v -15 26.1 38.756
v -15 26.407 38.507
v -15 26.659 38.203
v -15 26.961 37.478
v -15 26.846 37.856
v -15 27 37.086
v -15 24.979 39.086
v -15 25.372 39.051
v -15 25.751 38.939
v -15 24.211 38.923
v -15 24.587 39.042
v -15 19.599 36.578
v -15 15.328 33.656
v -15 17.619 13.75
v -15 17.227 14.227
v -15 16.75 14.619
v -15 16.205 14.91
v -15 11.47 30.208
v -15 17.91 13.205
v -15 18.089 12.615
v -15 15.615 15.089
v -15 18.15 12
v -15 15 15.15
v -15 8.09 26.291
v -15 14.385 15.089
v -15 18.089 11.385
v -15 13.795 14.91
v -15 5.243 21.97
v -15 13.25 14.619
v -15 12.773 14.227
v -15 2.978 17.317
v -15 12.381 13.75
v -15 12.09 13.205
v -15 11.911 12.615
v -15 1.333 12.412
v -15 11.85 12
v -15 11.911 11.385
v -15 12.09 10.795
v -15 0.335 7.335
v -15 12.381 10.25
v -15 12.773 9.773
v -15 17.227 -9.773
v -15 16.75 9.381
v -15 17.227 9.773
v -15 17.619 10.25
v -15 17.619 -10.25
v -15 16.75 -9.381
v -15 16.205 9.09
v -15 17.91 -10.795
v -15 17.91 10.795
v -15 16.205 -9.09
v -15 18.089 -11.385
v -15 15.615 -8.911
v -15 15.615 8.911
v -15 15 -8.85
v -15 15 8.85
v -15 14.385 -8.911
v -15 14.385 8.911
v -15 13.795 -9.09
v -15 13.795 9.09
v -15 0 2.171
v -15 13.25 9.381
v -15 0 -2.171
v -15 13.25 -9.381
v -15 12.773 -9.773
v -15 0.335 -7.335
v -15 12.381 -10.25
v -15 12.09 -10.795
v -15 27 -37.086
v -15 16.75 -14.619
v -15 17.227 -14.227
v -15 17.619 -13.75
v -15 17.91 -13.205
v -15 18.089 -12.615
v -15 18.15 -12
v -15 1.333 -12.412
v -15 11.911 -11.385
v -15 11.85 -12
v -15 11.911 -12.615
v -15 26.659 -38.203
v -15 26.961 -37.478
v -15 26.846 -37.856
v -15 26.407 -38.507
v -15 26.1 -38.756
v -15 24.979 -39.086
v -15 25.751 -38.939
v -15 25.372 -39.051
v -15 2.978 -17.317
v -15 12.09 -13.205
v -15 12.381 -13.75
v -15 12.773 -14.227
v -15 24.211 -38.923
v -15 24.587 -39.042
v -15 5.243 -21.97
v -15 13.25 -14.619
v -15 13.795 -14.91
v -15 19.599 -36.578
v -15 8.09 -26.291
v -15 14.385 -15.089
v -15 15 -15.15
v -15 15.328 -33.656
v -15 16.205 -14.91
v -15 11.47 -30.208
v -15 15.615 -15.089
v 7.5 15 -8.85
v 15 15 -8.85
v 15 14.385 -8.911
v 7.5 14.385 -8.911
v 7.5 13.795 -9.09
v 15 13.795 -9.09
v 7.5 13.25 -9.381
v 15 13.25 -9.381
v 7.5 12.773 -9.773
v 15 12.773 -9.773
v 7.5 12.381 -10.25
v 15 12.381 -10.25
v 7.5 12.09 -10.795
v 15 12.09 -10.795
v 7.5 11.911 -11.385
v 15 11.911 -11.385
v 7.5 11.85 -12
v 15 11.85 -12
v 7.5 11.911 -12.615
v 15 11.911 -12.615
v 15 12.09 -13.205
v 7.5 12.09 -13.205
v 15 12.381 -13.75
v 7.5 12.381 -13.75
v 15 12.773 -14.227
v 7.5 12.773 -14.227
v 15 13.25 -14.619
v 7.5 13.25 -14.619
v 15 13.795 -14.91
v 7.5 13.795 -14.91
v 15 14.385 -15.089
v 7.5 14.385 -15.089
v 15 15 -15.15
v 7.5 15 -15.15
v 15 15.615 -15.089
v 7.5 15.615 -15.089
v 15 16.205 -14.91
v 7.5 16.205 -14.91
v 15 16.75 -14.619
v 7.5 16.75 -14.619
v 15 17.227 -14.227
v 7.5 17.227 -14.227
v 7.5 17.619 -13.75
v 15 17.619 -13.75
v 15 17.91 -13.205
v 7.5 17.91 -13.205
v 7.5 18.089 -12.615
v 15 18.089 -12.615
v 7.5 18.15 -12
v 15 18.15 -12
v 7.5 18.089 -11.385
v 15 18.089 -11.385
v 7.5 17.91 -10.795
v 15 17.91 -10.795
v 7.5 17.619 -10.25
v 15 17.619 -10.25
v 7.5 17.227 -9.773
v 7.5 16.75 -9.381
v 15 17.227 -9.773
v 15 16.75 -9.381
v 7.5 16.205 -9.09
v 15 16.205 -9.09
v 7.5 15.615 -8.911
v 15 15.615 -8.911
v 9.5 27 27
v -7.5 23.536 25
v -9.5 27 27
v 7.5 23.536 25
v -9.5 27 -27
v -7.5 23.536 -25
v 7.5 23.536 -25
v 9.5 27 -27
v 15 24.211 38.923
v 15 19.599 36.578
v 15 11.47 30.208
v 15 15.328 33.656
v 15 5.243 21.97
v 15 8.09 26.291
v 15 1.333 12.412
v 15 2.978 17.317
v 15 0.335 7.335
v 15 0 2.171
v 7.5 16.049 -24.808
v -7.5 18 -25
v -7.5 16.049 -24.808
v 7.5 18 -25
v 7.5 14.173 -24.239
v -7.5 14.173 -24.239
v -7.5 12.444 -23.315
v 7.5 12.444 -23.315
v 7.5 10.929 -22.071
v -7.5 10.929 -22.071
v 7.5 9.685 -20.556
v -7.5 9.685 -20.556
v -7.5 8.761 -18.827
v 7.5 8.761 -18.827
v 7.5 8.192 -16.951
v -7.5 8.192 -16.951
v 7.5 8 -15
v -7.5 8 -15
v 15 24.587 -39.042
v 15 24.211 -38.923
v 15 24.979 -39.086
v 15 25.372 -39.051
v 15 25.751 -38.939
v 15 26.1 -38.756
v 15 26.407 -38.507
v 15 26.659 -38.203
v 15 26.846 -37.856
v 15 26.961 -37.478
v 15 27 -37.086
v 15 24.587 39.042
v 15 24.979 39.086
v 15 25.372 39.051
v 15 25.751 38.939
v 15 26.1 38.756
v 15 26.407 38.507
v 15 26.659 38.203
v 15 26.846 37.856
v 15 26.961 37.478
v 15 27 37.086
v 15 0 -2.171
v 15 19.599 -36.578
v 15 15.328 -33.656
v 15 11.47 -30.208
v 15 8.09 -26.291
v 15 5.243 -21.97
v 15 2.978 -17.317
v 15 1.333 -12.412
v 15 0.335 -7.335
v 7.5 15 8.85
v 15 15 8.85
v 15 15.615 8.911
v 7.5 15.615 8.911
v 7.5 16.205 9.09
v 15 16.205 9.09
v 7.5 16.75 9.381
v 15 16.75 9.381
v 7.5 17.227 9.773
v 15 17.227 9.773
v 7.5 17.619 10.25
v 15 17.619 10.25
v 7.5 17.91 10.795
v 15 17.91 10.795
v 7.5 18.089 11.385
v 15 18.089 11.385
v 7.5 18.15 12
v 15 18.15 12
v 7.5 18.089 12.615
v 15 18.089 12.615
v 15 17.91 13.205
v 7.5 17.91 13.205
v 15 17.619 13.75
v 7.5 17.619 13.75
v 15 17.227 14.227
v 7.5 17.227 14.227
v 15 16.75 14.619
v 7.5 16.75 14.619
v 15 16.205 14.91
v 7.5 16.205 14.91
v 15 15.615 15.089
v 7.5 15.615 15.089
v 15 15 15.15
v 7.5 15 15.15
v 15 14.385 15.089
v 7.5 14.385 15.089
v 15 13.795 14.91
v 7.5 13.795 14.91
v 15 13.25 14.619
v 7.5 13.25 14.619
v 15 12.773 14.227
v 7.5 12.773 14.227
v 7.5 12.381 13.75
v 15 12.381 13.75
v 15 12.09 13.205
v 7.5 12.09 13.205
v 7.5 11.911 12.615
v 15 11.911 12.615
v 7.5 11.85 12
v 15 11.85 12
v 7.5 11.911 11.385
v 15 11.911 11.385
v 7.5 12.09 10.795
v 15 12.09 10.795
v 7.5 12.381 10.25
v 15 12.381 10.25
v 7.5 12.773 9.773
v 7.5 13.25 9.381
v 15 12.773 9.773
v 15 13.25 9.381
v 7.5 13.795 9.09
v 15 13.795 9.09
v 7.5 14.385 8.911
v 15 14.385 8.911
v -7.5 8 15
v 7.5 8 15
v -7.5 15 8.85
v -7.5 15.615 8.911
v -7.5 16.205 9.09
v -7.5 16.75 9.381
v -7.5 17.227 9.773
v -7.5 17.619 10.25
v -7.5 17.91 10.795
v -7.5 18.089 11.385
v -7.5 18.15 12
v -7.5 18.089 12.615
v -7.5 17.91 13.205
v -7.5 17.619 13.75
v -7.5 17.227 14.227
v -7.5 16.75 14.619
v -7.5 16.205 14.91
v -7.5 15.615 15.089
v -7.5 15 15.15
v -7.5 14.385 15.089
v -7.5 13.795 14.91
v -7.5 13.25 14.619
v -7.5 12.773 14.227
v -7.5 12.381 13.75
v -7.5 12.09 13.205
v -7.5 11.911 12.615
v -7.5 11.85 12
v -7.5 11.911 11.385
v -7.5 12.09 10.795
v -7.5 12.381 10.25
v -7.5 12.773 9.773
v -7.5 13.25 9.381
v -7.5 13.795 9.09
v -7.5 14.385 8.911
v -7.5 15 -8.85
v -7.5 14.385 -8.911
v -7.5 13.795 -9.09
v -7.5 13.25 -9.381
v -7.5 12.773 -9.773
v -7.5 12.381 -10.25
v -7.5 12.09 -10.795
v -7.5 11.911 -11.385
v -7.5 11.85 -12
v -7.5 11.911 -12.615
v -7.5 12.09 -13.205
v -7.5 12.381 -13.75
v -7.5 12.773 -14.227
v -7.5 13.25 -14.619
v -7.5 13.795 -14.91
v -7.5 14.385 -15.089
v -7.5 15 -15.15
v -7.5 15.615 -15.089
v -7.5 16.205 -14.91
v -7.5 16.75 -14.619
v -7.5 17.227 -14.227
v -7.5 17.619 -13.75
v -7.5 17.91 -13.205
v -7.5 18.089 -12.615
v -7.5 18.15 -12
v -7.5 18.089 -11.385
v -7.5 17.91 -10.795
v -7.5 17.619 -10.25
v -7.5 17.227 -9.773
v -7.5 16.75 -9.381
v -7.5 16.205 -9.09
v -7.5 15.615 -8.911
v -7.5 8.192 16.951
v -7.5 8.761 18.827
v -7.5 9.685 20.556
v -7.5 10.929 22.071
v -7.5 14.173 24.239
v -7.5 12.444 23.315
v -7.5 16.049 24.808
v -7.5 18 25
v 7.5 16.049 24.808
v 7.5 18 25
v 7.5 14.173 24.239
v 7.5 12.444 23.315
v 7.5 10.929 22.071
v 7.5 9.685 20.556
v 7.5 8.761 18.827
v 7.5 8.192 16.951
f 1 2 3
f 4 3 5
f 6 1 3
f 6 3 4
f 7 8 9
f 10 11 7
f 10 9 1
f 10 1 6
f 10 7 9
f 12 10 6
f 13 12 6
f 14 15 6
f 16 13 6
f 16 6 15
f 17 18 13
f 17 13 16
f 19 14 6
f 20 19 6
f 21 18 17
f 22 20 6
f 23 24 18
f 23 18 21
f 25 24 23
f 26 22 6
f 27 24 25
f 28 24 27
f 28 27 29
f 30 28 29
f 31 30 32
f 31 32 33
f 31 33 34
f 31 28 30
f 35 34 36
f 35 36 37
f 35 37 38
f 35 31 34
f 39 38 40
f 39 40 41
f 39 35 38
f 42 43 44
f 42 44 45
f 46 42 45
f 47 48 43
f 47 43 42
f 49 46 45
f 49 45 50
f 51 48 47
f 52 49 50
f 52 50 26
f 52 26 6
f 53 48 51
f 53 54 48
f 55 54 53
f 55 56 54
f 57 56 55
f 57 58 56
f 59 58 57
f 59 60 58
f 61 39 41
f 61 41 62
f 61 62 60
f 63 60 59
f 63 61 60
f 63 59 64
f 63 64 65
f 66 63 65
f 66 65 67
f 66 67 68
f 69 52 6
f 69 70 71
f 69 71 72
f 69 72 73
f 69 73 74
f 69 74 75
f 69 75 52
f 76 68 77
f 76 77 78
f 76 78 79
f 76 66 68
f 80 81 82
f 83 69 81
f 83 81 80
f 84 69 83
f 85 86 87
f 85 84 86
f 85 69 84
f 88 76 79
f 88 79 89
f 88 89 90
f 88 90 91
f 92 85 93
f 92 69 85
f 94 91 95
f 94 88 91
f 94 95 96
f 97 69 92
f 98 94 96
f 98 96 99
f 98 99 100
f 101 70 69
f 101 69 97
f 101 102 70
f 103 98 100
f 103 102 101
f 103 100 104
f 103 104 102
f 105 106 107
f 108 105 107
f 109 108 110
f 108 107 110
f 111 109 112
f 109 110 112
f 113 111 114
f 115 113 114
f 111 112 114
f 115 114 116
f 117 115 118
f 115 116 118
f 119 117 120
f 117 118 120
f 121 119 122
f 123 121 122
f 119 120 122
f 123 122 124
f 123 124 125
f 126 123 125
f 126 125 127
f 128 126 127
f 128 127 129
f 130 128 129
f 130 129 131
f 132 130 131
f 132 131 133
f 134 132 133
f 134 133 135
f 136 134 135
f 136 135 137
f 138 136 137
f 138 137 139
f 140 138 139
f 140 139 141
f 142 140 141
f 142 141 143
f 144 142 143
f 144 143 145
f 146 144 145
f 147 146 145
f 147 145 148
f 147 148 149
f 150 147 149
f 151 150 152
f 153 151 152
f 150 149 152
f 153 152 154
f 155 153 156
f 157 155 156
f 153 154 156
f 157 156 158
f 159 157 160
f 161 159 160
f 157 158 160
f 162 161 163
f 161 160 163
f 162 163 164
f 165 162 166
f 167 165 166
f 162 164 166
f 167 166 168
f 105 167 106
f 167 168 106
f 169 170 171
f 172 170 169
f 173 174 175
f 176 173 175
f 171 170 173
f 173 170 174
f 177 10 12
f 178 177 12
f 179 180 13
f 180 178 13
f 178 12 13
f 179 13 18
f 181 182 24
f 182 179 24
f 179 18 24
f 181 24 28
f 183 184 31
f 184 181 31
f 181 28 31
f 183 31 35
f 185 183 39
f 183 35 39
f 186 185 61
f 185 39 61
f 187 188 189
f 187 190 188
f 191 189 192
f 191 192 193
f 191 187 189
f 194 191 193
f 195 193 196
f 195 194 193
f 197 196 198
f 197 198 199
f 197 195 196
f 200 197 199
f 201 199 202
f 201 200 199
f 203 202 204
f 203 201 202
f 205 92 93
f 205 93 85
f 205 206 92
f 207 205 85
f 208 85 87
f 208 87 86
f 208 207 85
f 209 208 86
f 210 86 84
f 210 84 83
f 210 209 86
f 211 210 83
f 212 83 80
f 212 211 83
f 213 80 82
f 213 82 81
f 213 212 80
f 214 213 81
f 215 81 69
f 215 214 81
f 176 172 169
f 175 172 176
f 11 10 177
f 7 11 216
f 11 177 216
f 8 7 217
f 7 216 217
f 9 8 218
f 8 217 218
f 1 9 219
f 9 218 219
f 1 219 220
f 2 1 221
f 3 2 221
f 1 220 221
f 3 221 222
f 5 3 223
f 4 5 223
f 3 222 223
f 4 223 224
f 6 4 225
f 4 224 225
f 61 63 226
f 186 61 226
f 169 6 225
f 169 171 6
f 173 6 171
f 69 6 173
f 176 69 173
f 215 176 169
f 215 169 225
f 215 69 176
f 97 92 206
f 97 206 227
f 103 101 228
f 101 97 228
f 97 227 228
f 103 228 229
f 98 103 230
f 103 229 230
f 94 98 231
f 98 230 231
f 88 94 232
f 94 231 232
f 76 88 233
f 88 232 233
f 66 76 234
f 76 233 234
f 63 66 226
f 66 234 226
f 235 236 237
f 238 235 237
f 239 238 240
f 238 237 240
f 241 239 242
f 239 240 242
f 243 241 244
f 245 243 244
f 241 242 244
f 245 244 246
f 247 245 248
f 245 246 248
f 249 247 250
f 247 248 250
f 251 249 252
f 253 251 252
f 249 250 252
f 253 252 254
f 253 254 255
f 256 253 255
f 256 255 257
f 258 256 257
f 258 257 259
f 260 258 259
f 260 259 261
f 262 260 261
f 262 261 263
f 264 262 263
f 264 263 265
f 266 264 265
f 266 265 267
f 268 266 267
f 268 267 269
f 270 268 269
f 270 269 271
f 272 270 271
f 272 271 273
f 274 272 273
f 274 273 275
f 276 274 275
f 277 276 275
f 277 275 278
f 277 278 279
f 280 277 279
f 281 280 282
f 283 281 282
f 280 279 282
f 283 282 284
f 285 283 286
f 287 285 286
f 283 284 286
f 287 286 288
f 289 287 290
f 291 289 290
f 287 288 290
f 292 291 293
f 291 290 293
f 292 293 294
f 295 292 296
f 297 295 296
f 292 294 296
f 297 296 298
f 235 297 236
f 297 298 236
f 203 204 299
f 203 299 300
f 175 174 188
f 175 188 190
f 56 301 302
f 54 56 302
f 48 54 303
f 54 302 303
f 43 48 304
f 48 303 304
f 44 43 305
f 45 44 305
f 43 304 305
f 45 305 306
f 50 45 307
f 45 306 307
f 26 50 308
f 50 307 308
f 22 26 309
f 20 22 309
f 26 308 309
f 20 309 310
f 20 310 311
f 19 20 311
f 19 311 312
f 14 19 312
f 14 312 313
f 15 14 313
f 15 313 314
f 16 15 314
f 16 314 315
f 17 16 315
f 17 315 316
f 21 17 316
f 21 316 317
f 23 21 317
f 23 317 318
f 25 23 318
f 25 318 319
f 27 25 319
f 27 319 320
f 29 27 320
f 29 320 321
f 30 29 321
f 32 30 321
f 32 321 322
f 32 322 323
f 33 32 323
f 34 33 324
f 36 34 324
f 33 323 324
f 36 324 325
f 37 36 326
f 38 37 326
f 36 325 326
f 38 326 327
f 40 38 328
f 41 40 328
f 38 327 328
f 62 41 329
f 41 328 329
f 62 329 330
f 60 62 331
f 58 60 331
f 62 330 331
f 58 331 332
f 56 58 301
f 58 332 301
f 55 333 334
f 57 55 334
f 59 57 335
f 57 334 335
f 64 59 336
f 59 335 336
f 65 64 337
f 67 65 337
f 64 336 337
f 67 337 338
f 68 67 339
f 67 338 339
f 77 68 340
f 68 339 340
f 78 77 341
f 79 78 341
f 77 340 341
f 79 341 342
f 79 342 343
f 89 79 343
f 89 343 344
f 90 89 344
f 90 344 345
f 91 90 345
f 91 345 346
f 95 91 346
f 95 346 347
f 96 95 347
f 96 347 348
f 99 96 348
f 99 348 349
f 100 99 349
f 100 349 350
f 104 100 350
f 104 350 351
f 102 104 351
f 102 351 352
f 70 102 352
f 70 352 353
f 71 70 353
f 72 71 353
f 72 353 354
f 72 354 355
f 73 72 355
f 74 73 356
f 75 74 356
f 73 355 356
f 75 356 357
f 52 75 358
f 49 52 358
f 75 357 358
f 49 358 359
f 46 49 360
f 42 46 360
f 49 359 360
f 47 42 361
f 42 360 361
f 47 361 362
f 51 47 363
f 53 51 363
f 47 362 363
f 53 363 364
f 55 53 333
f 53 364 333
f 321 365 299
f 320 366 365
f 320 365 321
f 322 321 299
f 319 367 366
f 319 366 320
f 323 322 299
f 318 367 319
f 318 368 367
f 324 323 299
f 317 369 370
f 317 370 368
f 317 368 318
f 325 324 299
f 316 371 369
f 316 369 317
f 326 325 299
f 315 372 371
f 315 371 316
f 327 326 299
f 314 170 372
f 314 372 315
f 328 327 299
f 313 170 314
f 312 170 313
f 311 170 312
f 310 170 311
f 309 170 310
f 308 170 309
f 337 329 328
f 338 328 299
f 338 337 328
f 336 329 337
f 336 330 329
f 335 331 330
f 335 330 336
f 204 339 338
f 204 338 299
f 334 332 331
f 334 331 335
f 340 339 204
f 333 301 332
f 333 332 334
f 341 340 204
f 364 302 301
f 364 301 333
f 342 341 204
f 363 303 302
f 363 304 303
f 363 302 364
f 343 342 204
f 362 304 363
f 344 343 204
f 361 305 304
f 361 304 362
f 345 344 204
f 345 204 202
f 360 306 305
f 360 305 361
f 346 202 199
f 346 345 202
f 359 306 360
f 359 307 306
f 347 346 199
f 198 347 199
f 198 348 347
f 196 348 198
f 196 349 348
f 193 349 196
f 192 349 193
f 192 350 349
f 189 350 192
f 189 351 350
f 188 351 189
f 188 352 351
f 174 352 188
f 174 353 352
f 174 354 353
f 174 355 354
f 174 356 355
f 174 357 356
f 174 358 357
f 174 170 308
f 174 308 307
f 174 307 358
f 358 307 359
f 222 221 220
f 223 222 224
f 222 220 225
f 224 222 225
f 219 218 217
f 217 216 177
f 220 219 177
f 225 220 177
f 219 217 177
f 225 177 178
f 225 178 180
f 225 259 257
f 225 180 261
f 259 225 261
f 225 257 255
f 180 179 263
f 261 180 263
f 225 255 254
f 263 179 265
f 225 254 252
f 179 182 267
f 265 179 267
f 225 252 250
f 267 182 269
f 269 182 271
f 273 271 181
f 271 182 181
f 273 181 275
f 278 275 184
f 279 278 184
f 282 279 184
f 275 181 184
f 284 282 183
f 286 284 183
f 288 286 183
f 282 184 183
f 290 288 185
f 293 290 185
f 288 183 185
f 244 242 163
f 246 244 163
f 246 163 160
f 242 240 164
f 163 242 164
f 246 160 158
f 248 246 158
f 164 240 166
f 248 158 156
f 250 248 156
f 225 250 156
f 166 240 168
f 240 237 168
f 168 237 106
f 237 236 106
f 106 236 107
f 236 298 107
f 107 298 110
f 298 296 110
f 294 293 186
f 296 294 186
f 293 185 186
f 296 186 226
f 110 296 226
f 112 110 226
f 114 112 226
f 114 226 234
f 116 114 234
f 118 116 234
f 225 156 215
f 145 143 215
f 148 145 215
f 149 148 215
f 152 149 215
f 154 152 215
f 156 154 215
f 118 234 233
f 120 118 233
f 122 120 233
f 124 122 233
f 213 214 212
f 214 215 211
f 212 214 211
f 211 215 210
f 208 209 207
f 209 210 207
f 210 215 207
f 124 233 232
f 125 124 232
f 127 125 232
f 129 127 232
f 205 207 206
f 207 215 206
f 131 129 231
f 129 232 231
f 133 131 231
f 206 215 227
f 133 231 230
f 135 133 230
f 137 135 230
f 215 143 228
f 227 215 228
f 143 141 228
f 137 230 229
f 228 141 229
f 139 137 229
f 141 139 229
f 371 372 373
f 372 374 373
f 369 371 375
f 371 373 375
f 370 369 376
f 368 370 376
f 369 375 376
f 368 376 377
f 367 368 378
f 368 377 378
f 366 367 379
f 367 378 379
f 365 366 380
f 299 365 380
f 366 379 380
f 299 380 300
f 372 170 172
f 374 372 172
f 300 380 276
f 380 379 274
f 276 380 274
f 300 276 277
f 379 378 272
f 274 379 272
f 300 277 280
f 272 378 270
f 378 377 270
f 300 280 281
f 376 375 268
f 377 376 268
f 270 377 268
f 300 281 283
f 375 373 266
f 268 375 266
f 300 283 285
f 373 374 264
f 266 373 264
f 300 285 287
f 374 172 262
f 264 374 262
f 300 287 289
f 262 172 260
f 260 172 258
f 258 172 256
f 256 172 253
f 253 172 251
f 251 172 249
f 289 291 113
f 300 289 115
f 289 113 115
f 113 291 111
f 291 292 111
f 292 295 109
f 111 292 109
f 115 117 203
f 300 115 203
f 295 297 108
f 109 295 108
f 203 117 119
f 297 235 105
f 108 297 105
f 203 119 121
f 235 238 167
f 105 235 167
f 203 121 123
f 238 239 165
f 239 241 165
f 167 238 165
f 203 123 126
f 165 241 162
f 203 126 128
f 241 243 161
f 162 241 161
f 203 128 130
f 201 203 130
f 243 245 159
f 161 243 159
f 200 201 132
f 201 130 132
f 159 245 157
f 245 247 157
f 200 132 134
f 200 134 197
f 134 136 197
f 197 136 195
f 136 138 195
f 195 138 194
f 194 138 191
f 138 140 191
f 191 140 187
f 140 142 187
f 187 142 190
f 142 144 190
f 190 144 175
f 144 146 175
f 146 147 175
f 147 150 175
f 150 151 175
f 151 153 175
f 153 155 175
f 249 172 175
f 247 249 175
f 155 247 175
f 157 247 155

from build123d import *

# Parameters (mm, degrees)
SKETCH1_W           = 30
SKETCH1_H           = 80
BOSS_EXTRUDE1_DEPTH = 27
SKETCH5_W           = 30
SKETCH5_H           = 10
BOSS_EXTRUDE2_DEPTH = 6
SKETCH2_R           = 3.15
CUT_EXTRUDE1_DEPTH  = 40
FILLET5_R           = 40
FILLET6_R           = 40
FILLET7_R           = 2
FILLET8_R           = 2
SKETCH6_W           = 10
SKETCH6_H           = 6
CUT_EXTRUDE2_DEPTH  = 60.301649892
SKETCH7_W           = 15
SKETCH7_H           = 50
CUT_EXTRUDE3_DEPTH  = 19
FILLET9_R           = 10
CHAMFER1_SIZE       = 2
CHAMFER1_SIZE2      = 3.464101615


with BuildPart() as part:
    # Sketch1 → Boss-Extrude1 (new body)
    with BuildSketch(Plane(origin=(0, 0, 0), x_dir=(1, 0, 0), z_dir=(0, 1, 0))):
        Rectangle(SKETCH1_W, SKETCH1_H)
    extrude(amount=BOSS_EXTRUDE1_DEPTH)

    # Sketch5 → Boss-Extrude2 (add)
    with BuildSketch(Plane(origin=(0, 27, 0), x_dir=(1, 0, 0), z_dir=(0, 1, 0))):
        Rectangle(SKETCH5_W, SKETCH5_H)
    extrude(amount=BOSS_EXTRUDE2_DEPTH)

    # Sketch2 → Cut-Extrude1 (cut)
    with BuildSketch(Plane(origin=(15, 0, 0), x_dir=(0, 0, -1), z_dir=(1, 0, 0))):
        with Locations((-12, 15)):
            Circle(SKETCH2_R)
        with Locations(Location((12, 15, 0), (0, 0, 180))):
            Circle(SKETCH2_R)
    extrude(amount=-CUT_EXTRUDE1_DEPTH, mode=Mode.SUBTRACT)

    # Fillet5
    # the kernel refuses this fillet: 40 mm, written as the material it takes off along each edge
    with BuildSketch(Plane(origin=(109.571401597, 0, -40), x_dir=(0, 0, 1), z_dir=(-1, 0, 0))) as fillet5_piece_1:
        with BuildLine():
            CenterArc((37.828560639, 40), FILLET5_R, 198.965574989, 71.034425011)
            Line((0, 27), (-0.756571213, 26.74))
            ThreePointArc((-0.756571213, 26.74), (-0.8, 13.5), (-0.8, 0))
            Line((-0.8, 0), (0, -0.8))
            Line((0, -0.8), (37.828560639, -0.8))
            Line((37.828560639, -0.8), (37.828560639, 0))
        make_face()
    extrude(amount=219.142803194, mode=Mode.SUBTRACT)

    # Fillet6
    # the kernel refuses this fillet: 40 mm, written as the material it takes off along each edge
    with BuildSketch(Plane(origin=(-109.571401597, 0, 40), x_dir=(0, 1, 0), z_dir=(1, 0, 0))) as fillet6_piece_1:
        with BuildLine():
            CenterArc((40, -37.828560639), FILLET6_R, 108.965574989, 71.034425011)
            Line((0, -37.828560639), (-0.8, -37.828560639))
            Line((-0.8, -37.828560639), (-0.8, 0))
            Line((-0.8, 0), (0, 0.8))
            ThreePointArc((0, 0.8), (13.5, 0.8), (26.74, 0.756571213))
            Line((26.74, 0.756571213), (27, 0))
        make_face()
    extrude(amount=219.142803194, mode=Mode.SUBTRACT)

    # Fillet7
    fillet7_edges = [part.edges().sort_by_distance(p)[0] for p in [
        (0, 27, -40),
    ]]
    fillet(fillet7_edges, radius=FILLET7_R)

    # Fillet8
    fillet8_edges = [part.edges().sort_by_distance(p)[0] for p in [
        (0, 27, 40),
    ]]
    fillet(fillet8_edges, radius=FILLET8_R)

    # Sketch6 → Cut-Extrude2 (cut, through all)
    with BuildSketch(Plane(origin=(15, 0, 0), x_dir=(0, 0, -1), z_dir=(1, 0, 0))):
        with Locations((0, 30)):
            Rectangle(SKETCH6_W, SKETCH6_H)
    extrude(amount=-CUT_EXTRUDE2_DEPTH, mode=Mode.SUBTRACT)

    # Sketch7 → Cut-Extrude3 (cut)
    with BuildSketch(Plane(origin=(0, 27, 0), x_dir=(1, 0, 0), z_dir=(0, 1, 0))):
        Rectangle(SKETCH7_W, SKETCH7_H)
    extrude(amount=-CUT_EXTRUDE3_DEPTH, mode=Mode.SUBTRACT)

    # Fillet9
    fillet9_edges = [part.edges().sort_by_distance(p)[0] for p in [
        (0, 8, -25),
        (0, 8, 25),
    ]]
    fillet(fillet9_edges, radius=FILLET9_R)

    # Chamfer1
    chamfer1_edges = [part.edges().sort_by_distance(p)[0] for p in [
        (-7.5, 27, 0),
        (0, 27, 25),
        (7.5, 27, 0),
        (0, 27, -25),
    ]]
    chamfer1_side = [part.faces().sort_by_distance(p)[0] for p in [
        (-14.199914204, 27, 0),
    ]]
    chamfer(chamfer1_edges, length=CHAMFER1_SIZE, length2=CHAMFER1_SIZE2, reference=chamfer1_side[0])


solid = part.part
